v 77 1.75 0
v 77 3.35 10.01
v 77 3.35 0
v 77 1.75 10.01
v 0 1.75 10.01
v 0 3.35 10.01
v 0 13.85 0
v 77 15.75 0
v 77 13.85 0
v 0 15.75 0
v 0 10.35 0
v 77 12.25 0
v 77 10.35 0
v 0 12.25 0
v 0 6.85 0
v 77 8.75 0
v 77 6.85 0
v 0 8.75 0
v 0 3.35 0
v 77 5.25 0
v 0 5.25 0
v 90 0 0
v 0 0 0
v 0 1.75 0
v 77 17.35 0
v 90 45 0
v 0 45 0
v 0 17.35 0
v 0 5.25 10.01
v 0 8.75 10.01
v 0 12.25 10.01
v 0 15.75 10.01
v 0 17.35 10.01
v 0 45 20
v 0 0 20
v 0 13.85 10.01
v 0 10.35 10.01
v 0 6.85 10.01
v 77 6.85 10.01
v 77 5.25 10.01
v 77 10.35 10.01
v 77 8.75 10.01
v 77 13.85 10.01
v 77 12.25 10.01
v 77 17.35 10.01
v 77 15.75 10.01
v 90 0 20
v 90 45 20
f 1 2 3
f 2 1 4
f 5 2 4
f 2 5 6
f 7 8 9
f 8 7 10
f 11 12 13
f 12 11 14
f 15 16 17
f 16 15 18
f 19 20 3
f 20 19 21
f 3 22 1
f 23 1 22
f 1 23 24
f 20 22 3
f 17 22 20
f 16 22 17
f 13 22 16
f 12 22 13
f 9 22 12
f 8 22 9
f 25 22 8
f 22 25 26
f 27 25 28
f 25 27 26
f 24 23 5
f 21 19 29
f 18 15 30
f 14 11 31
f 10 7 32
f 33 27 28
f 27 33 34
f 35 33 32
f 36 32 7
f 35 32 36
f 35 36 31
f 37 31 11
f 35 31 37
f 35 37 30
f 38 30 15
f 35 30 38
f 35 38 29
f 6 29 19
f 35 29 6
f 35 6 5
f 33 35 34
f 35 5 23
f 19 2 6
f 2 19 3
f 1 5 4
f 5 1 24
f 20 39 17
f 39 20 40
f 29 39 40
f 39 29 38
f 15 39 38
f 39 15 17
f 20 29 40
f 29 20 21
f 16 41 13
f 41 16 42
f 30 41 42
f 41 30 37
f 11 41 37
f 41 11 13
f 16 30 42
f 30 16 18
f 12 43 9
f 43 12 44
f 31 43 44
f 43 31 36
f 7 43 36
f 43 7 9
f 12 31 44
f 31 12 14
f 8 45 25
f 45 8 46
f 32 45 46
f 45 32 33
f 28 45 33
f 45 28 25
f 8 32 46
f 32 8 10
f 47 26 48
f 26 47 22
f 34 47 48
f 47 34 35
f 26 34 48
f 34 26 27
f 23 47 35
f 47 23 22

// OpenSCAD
// Microscope slide drying rack - solid base with 10 parallel slots for standing slides.
// Orientation: Rests on XY plane at Z=0, builds upward. Centred on origin.

// Base dimensions
L_base = 90;
W_base = 45;
H_base = 20;

// Slide dimensions (75 x 25 x 1 mm)
slide_len = 75;
slide_w   = 25;
slide_thk = 1;

// Slot dimensions
slot_len = 77;      // Must be slightly shorter than slide_len to fit
slot_w   = 1.6;     // Width in Y
slot_deep = 10;     // Depth in Z

// Slot spacing
slot_spacing = 3.5; // Centre-to-centre in Y

// Number of slots
n_slots = 10;

$fn = 64;

difference() {
    // Create the solid base block
    translate([0, 0, 0]) cube([L_base, W_base, H_base]);
    
    // Cut the slots
    for (i = [0 : n_slots - 1]) {
        // Calculate Y position for each slot
        // Total span = (n_slots - 1) * slot_spacing
        // Half span = Total span / 2
        // Y_pos = -Half span + i * slot_spacing
        y_pos = -((n_slots - 1) * slot_spacing / 2) + i * slot_spacing;
        
        // Define the slot cutter shape
        // The slot runs along X, is narrow in Y, and deep in Z.
        // We use a cube for the cutter.
        // Dimensions: [slot_len, slot_w, slot_deep]
        // Position: X=0, Y=y_pos, Z=0
        
        // Extend slightly past faces to ensure clean cuts (Rule 5)
        // The slot is 77mm long, block is 90mm. No coplanar faces in X.
        // The slot is 1.6mm wide, block is 45mm. No coplanar faces in Y.
        // The slot is 10mm deep, block is 20mm. No coplanar faces in Z.
        // However, to be safe and follow the rule strictly for "cutting shapes",
        // we extend the Z dimension slightly past the bottom face of the block.
        // The block top is at Z=20. The slot goes to Z=10.
        // We extend the cutter to Z=10.01 to ensure it cuts through.
        
        translate([0, y_pos, 0]) cube([slot_len, slot_w, slot_deep + 0.01]);
    }
}
